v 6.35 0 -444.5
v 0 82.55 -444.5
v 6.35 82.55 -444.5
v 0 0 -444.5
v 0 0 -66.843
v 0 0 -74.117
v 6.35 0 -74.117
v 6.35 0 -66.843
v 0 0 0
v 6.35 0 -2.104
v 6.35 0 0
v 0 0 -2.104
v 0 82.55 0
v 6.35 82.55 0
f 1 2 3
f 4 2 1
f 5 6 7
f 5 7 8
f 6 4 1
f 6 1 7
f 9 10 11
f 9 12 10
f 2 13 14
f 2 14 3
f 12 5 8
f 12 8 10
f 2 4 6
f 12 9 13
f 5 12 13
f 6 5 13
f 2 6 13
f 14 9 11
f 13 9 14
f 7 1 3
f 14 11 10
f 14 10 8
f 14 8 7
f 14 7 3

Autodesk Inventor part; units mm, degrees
ref_plane "YZ Plane" through (0, 0, 0) normal (1, 0, 0) x (0, 1, 0)
ref_plane "XZ Plane" through (0, 0, 0) normal (0, 1, 0) x (-1, 0, 0)
ref_plane "XY Plane" through (0, 0, 0) normal (0, 0, 1) x (1, 0, 0)
sketch "Sketch1" plane through (0, 0, 0) normal (1, 0, 0) x (0, 1, 0)
  line L0 (444.5, 0) -> (444.5, -2.1042)
  line L1 (0, -2.1042) -> (0, 0)
  line L2 (0, -74.1174) -> (0, -66.8433)
  line L3 (0, 0) -> (82.55, 0)
  line L4 (82.55, 0) -> (82.55, -444.5)
  line L5 (82.55, -444.5) -> (0, -444.5)
  line L6 (0, -444.5) -> (0, 0)
  point P0 (25.4, -50.8)
  point P1 (25.4, -393.7)
  dimension "d2" = 82.55
  dimension "d3" = 444.5
  dimension "d4" = 50.8
  dimension "d5" = 25.4
  dimension "d6" = 50.8
  dimension "d7" = 25.4
extrude "Extrusion1" add sketch "Sketch1" along normal blind 6.35
properties part number "DriveTrainPlate"
